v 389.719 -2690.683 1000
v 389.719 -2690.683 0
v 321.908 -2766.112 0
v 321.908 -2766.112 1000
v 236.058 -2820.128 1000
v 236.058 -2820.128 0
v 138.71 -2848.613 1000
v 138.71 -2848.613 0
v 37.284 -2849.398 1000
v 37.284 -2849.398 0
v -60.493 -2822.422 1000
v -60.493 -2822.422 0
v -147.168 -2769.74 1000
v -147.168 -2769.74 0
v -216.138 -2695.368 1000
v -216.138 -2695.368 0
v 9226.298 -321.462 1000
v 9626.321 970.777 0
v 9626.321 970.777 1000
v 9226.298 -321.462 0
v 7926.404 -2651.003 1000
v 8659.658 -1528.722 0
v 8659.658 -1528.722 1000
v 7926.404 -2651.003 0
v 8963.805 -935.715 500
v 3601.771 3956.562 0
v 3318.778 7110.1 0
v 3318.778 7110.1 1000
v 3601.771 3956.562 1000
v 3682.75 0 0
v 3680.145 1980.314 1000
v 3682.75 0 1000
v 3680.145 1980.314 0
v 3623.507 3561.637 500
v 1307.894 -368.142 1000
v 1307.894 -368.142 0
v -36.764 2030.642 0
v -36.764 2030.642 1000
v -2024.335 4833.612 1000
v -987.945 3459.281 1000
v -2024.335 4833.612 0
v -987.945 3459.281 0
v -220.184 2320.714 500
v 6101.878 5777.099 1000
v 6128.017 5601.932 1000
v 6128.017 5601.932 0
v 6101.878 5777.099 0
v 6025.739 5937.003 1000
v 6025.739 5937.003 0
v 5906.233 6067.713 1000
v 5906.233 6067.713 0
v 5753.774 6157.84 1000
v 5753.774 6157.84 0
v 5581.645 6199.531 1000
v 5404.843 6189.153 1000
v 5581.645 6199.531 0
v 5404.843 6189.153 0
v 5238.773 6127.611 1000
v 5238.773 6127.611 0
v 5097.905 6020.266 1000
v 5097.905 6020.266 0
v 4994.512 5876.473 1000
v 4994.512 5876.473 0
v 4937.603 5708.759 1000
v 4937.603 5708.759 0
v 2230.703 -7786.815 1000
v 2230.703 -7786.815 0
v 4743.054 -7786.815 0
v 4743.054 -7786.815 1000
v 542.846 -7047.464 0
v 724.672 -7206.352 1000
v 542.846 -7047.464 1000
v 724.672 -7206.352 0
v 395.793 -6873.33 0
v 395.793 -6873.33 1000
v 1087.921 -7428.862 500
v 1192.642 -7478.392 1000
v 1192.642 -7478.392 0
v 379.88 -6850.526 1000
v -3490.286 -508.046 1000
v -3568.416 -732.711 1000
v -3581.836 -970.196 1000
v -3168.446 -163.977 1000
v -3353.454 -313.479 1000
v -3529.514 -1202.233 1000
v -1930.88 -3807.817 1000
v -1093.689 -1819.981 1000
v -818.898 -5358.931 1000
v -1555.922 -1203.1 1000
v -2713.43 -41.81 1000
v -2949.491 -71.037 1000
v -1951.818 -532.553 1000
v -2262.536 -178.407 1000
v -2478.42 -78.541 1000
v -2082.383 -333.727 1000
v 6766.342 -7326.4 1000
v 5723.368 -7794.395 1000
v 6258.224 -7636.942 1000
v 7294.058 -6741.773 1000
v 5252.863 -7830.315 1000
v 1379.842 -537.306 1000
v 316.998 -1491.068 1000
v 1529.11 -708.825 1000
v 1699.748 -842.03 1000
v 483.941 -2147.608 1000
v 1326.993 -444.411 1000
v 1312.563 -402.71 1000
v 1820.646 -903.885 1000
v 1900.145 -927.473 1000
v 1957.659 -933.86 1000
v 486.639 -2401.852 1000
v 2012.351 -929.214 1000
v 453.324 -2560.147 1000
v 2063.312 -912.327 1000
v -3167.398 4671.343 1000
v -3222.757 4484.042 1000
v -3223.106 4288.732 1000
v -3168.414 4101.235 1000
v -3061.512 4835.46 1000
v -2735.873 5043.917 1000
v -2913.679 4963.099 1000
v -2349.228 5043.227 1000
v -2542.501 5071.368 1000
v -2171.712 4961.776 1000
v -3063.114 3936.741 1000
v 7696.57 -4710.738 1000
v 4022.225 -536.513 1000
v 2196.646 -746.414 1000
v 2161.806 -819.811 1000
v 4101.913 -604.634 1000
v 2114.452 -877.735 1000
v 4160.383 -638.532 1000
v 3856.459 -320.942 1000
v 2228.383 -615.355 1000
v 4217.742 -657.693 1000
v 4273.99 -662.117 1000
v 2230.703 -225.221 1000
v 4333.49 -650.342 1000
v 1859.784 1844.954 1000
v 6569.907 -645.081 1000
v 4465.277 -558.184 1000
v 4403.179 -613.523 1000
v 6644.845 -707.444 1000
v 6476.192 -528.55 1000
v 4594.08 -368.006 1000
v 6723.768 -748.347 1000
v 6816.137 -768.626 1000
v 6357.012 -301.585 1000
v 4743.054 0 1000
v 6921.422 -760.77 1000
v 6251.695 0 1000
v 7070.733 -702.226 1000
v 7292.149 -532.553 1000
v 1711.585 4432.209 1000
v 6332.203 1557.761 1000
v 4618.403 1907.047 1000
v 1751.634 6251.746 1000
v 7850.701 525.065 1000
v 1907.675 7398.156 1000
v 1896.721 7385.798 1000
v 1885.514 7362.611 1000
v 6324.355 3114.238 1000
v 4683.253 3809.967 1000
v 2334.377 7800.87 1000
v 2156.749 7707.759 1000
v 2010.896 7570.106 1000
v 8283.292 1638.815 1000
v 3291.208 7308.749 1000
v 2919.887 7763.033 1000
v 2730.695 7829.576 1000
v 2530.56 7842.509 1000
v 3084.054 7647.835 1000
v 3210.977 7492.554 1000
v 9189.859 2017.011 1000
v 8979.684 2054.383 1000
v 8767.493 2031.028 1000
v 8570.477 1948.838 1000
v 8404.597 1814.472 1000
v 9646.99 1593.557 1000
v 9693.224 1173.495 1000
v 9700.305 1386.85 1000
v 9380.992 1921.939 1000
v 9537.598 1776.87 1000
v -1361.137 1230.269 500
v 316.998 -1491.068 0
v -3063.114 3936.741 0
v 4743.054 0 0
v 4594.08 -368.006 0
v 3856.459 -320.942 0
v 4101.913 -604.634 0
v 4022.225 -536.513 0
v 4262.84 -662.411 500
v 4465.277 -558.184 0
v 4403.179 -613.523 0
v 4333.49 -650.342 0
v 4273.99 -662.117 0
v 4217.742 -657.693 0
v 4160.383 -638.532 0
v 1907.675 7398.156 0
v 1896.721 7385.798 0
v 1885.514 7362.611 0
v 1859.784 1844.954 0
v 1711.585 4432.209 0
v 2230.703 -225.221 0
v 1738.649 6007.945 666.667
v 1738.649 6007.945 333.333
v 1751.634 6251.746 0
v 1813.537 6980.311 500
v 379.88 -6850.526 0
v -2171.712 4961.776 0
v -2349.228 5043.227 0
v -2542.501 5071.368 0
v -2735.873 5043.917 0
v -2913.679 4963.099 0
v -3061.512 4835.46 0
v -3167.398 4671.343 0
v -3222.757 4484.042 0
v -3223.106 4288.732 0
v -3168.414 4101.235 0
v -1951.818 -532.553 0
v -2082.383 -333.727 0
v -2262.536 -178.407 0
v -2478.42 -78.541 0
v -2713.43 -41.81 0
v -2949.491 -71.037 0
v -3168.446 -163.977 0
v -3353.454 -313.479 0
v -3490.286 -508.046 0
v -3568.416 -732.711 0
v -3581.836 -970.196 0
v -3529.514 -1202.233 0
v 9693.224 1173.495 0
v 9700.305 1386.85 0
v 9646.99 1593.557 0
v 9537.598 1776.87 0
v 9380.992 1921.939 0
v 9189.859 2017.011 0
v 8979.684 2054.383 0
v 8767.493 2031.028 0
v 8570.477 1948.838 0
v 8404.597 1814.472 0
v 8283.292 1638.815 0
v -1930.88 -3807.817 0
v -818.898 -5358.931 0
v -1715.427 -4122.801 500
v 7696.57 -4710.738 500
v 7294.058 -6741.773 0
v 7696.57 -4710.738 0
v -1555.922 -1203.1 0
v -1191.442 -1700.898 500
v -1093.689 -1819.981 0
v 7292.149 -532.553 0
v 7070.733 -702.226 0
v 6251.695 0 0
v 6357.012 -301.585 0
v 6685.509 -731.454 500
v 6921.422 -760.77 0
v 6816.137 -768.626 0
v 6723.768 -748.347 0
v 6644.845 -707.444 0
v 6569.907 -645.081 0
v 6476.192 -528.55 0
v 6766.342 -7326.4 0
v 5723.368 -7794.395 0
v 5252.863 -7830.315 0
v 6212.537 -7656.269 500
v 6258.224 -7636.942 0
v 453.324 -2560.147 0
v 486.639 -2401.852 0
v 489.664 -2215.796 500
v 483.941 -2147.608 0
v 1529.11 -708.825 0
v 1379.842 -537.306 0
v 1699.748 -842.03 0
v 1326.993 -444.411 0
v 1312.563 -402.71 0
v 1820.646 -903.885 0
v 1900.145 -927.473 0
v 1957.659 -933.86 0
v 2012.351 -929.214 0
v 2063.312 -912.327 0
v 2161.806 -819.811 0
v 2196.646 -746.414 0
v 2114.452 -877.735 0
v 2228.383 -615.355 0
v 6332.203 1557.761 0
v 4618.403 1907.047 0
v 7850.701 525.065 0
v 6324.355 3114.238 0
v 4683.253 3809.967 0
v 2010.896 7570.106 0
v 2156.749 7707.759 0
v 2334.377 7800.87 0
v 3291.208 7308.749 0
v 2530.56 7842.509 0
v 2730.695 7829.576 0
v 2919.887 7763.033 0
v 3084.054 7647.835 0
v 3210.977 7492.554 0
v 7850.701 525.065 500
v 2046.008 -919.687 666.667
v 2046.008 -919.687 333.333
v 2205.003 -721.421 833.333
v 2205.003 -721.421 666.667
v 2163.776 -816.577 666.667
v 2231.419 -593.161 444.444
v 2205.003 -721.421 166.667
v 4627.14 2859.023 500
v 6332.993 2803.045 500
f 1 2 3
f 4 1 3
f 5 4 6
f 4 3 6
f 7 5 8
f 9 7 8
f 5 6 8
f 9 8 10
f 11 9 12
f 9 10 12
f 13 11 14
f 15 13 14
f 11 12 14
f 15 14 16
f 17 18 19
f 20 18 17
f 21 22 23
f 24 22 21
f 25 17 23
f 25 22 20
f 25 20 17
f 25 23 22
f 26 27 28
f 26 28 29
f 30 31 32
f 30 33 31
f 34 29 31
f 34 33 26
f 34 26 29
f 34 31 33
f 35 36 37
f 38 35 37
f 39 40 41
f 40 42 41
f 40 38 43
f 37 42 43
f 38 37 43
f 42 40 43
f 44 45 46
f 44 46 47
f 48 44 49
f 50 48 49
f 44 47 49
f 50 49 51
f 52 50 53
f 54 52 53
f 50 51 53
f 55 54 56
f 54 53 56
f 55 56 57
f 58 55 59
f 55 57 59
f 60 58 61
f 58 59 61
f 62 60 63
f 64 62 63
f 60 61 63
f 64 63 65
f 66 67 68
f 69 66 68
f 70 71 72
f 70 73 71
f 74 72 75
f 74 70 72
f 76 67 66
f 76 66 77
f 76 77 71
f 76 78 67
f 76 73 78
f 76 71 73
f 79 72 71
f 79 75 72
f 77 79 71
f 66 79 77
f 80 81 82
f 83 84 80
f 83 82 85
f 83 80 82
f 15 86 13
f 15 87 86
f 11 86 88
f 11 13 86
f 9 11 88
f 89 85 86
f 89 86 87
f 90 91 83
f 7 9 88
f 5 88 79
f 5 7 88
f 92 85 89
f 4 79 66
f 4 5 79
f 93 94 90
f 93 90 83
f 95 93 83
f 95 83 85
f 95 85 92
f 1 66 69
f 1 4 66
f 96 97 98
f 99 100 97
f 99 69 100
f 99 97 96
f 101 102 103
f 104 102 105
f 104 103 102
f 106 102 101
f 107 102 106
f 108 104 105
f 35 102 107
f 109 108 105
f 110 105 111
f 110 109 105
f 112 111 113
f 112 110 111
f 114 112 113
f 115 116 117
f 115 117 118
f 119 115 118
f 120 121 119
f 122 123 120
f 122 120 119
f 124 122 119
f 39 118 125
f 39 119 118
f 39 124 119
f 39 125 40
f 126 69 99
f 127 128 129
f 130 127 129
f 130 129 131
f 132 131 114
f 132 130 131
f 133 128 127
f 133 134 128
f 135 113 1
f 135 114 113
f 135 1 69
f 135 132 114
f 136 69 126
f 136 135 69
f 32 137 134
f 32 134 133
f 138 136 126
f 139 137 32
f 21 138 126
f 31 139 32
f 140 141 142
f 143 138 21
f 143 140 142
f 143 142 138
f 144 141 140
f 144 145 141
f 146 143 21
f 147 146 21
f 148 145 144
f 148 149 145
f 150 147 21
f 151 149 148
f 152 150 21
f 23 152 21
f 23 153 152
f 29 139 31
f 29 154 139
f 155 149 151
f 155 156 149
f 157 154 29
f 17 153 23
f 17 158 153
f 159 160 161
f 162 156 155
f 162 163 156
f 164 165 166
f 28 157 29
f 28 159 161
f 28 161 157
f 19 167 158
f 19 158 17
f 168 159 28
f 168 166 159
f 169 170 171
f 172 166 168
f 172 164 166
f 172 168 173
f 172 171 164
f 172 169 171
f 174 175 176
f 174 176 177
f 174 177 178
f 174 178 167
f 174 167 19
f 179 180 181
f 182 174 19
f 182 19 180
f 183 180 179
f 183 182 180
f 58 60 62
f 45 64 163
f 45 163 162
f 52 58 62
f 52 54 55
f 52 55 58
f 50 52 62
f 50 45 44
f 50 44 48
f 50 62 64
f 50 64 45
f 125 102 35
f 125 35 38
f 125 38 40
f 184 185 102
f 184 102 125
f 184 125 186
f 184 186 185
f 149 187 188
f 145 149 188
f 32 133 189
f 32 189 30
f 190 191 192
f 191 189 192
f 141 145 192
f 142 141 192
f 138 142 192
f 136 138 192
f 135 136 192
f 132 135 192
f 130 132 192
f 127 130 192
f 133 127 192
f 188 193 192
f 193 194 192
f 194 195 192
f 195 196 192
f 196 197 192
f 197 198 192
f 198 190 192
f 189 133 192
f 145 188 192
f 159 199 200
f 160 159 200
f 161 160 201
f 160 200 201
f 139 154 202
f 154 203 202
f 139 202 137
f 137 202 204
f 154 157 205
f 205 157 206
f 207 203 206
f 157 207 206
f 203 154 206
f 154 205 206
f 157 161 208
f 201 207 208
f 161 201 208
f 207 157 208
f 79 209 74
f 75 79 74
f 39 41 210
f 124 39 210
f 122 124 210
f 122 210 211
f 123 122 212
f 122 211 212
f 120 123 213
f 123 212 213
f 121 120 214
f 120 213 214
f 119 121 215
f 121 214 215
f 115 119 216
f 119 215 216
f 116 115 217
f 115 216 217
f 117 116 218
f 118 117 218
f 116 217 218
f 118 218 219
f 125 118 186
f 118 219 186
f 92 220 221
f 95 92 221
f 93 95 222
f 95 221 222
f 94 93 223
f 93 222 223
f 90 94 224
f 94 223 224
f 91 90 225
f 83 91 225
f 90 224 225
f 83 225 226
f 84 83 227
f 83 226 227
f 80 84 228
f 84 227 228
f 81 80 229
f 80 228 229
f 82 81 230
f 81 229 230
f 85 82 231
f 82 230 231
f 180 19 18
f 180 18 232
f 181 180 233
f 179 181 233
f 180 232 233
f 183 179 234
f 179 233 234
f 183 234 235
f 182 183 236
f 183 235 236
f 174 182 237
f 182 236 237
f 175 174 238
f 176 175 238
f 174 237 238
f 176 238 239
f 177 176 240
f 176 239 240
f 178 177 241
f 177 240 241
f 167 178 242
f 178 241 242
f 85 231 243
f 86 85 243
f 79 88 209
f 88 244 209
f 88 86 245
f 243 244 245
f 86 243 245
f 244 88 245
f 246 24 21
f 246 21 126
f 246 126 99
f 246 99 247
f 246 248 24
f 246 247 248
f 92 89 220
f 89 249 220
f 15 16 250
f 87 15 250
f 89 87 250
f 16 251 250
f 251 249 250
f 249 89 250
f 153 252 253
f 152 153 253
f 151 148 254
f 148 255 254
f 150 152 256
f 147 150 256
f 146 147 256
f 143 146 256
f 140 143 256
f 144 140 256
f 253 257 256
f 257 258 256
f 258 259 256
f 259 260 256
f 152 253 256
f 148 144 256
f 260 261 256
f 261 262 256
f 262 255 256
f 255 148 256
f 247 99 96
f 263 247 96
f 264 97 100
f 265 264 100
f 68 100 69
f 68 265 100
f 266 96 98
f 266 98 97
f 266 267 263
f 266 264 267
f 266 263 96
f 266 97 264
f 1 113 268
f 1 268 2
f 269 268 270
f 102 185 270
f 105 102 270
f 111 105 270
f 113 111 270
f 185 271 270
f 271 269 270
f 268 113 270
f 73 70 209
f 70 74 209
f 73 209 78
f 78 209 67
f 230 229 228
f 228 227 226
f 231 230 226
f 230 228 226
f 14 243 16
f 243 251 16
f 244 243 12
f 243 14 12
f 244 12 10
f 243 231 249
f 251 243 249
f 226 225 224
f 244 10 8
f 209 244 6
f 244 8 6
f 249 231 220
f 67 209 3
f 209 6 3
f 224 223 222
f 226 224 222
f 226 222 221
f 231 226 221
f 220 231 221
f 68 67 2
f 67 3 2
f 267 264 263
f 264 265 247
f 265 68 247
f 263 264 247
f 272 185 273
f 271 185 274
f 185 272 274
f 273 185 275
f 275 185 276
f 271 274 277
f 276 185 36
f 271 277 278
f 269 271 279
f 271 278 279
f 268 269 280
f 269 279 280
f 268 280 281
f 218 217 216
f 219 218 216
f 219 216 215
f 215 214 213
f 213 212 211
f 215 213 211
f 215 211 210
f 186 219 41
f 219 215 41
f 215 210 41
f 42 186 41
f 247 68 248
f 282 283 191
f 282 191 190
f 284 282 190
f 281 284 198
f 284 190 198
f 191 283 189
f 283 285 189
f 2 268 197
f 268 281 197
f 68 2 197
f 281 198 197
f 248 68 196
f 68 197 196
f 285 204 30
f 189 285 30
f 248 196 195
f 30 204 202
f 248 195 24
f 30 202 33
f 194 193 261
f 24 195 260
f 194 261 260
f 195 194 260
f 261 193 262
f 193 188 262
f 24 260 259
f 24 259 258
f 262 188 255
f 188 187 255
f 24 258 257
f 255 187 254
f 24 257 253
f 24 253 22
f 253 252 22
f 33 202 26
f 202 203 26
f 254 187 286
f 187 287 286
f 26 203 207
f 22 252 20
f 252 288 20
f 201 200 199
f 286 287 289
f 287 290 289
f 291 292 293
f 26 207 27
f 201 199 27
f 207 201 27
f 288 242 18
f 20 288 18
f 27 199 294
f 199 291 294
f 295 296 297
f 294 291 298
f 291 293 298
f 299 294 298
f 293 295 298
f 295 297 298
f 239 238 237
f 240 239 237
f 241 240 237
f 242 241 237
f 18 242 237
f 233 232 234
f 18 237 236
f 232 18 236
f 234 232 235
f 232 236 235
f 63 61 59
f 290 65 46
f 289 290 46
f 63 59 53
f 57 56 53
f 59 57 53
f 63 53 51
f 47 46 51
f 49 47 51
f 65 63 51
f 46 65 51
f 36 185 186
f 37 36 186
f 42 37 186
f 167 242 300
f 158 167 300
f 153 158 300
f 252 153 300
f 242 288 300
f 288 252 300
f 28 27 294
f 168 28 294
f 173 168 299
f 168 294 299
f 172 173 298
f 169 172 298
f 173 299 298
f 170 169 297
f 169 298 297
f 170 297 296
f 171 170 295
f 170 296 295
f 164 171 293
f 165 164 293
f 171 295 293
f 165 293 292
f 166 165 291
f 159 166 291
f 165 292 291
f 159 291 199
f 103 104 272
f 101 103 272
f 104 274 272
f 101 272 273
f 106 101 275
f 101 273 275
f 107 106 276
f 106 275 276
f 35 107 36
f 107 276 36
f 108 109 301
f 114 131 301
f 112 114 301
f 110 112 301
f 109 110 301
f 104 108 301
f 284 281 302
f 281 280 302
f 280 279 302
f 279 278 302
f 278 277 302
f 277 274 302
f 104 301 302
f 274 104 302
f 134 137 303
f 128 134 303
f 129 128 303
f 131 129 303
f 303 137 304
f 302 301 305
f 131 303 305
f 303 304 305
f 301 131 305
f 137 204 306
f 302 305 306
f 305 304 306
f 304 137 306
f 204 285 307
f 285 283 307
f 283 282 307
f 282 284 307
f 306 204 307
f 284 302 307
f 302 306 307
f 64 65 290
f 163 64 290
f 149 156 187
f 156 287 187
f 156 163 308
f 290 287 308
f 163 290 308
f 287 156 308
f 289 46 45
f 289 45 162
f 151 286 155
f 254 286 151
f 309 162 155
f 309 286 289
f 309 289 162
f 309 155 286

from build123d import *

# Parameters (mm, degrees)
SALIENTE_EXTRUIR2_DEPTH = 1000


with BuildPart() as part:
    # Croquis1 → Saliente-Extruir2 (new body)
    with BuildSketch(Plane.XY):
        with BuildLine():
            add(Edge.make_bspline(
                [(-3529.51384395, -1202.233467952), (-1856.037352978, -4219.223232207), (379.87956173, -6850.526052201)],
                knots=[0, 0, 0, 1, 1, 1], degree=2))
            Line((379.87956173, -6850.526052201), (395.792572055, -6873.329985392))
            add(Edge.make_bspline(
                [(2230.703376721, -7786.815055438), (862.593094055, -7527.652453331), (395.792572055, -6873.329985392)],
                knots=[0, 0, 0, 0.982960508, 0.982960508, 0.982960508], degree=2))
            Line((2230.703376721, -7786.815055438), (4743.053831113, -7786.815055438))
            add(Edge.make_bspline(
                [(7294.057713376, -6741.772668763), (6406.517718068, -8048.244997382), (4743.053831113, -7786.815055438)],
                knots=[0, 0, 0, 1, 1, 1], degree=2))
            add(Edge.make_bspline(
                [(7926.403518411, -2651.003443214), (7782.909975582, -4725.088301009), (7294.057713376, -6741.772668763)],
                knots=[0, 0, 0, 1, 1, 1], degree=2))
            add(Edge.make_bspline(
                [(9626.321129043, 970.777177928), (9151.24781504, -1031.315970782), (7926.403518411, -2651.003443214)],
                knots=[0, 0, 0, 1, 1, 1], degree=2))
            ThreePointArc((9626.321129043, 970.777177928), (9288.825480559, 1976.310214309), (8283.292444177, 1638.814565826))
            add(Edge.make_bspline(
                [(8283.292444177, 1638.814565826), (7913.681655155, 496.999655055), (7292.149119226, -532.552706313)],
                knots=[0, 0, 0, 1, 1, 1], degree=2))
            add(Edge.make_bspline(
                [(7292.149119226, -532.552706313), (6599.095962995, -1196.63110018), (6251.694578753, 0)],
                knots=[0, 0, 0, 1, 1, 1], degree=2))
            add(Edge.make_bspline(
                [(6128.016784622, 5601.93212094), (6476.130264467, 2805.124465974), (6251.694578753, 0)],
                knots=[0, 0, 0, 1, 1, 1], degree=2))
            ThreePointArc((6128.016784622, 5601.93212094), (5581.64471986, 6199.530685666), (4937.603302748, 5708.758711365))
            add(Edge.make_bspline(
                [(4937.603302748, 5708.758711365), (4413.951962857, 2863.666849894), (4743.053831113, 0)],
                knots=[0, 0, 0, 1, 1, 1], degree=2))
            add(Edge.make_bspline(
                [(4743.053831113, 0), (4312.779053917, -1324.821383248), (3682.749977241, 0)],
                knots=[0, 0, 0, 1, 1, 1], degree=2))
            add(Edge.make_bspline(
                [(3318.777516252, 7110.100341624), (3746.251250024, 3568.224392724), (3682.749977241, 0)],
                knots=[0, 0, 0, 1, 1, 1], degree=2))
            ThreePointArc((3318.777516252, 7110.100341624), (2730.695177179, 7829.57571119), (1907.674772526, 7398.15589423))
            add(Edge.make_bspline(
                [(1907.674772526, 7398.15589423), (1727.374281104, 7282.699726861), (1453.82223485, 2643.683209052), (2230.703376721, -225.221152689)],
                knots=[0, 0, 0, 0, 1, 1, 1, 1], degree=3))
            add(Edge.make_bspline(
                [(2230.703376721, -225.221152689), (2353.623865165, -1570.04707712), (1307.535590584, -636.844625668), (1307.894403605, -368.14161135)],
                knots=[0, 0, 0, 0, 1, 1, 1, 1], degree=3))
            add(Edge.make_bspline(
                [(1307.894403605, -368.14161135), (-82.147377215, 2408.693638396), (-2024.334507479, 4833.611616382)],
                knots=[0, 0, 0, 1, 1, 1], degree=2))
            ThreePointArc((-2024.334507479, 4833.611616382), (-2992.159941905, 4904.5661391), (-3063.114464623, 3936.740704674))
            add(Edge.make_bspline(
                [(316.998012386, -1491.068073752), (-1349.216688817, 1237.70132277), (-3063.114464623, 3936.740704674)],
                knots=[0, 0, 0, 1, 1, 1], degree=2))
            add(Edge.make_bspline(
                [(316.998012386, -1491.068073752), (625.968743176, -2340.71628823), (389.719115296, -2690.682781105)],
                knots=[0, 0, 0, 0.430745702, 0.430745702, 0.430745702], degree=2))
            ThreePointArc((389.719115296, -2690.682781105), (88.024050835, -2852.52229192), (-216.138022944, -2695.368316294))
            add(Edge.make_bspline(
                [(-216.138022944, -2695.368316294), (-1298.906710721, -1787.836055316), (-1951.818132837, -532.552706313)],
                knots=[0, 0, 0, 1, 1, 1], degree=2))
            ThreePointArc((-1951.818132837, -532.552706313), (-3062.205881719, -109.87974688), (-3529.51384395, -1202.233467952))
        make_face()
    extrude(amount=SALIENTE_EXTRUIR2_DEPTH)


solid = part.part
